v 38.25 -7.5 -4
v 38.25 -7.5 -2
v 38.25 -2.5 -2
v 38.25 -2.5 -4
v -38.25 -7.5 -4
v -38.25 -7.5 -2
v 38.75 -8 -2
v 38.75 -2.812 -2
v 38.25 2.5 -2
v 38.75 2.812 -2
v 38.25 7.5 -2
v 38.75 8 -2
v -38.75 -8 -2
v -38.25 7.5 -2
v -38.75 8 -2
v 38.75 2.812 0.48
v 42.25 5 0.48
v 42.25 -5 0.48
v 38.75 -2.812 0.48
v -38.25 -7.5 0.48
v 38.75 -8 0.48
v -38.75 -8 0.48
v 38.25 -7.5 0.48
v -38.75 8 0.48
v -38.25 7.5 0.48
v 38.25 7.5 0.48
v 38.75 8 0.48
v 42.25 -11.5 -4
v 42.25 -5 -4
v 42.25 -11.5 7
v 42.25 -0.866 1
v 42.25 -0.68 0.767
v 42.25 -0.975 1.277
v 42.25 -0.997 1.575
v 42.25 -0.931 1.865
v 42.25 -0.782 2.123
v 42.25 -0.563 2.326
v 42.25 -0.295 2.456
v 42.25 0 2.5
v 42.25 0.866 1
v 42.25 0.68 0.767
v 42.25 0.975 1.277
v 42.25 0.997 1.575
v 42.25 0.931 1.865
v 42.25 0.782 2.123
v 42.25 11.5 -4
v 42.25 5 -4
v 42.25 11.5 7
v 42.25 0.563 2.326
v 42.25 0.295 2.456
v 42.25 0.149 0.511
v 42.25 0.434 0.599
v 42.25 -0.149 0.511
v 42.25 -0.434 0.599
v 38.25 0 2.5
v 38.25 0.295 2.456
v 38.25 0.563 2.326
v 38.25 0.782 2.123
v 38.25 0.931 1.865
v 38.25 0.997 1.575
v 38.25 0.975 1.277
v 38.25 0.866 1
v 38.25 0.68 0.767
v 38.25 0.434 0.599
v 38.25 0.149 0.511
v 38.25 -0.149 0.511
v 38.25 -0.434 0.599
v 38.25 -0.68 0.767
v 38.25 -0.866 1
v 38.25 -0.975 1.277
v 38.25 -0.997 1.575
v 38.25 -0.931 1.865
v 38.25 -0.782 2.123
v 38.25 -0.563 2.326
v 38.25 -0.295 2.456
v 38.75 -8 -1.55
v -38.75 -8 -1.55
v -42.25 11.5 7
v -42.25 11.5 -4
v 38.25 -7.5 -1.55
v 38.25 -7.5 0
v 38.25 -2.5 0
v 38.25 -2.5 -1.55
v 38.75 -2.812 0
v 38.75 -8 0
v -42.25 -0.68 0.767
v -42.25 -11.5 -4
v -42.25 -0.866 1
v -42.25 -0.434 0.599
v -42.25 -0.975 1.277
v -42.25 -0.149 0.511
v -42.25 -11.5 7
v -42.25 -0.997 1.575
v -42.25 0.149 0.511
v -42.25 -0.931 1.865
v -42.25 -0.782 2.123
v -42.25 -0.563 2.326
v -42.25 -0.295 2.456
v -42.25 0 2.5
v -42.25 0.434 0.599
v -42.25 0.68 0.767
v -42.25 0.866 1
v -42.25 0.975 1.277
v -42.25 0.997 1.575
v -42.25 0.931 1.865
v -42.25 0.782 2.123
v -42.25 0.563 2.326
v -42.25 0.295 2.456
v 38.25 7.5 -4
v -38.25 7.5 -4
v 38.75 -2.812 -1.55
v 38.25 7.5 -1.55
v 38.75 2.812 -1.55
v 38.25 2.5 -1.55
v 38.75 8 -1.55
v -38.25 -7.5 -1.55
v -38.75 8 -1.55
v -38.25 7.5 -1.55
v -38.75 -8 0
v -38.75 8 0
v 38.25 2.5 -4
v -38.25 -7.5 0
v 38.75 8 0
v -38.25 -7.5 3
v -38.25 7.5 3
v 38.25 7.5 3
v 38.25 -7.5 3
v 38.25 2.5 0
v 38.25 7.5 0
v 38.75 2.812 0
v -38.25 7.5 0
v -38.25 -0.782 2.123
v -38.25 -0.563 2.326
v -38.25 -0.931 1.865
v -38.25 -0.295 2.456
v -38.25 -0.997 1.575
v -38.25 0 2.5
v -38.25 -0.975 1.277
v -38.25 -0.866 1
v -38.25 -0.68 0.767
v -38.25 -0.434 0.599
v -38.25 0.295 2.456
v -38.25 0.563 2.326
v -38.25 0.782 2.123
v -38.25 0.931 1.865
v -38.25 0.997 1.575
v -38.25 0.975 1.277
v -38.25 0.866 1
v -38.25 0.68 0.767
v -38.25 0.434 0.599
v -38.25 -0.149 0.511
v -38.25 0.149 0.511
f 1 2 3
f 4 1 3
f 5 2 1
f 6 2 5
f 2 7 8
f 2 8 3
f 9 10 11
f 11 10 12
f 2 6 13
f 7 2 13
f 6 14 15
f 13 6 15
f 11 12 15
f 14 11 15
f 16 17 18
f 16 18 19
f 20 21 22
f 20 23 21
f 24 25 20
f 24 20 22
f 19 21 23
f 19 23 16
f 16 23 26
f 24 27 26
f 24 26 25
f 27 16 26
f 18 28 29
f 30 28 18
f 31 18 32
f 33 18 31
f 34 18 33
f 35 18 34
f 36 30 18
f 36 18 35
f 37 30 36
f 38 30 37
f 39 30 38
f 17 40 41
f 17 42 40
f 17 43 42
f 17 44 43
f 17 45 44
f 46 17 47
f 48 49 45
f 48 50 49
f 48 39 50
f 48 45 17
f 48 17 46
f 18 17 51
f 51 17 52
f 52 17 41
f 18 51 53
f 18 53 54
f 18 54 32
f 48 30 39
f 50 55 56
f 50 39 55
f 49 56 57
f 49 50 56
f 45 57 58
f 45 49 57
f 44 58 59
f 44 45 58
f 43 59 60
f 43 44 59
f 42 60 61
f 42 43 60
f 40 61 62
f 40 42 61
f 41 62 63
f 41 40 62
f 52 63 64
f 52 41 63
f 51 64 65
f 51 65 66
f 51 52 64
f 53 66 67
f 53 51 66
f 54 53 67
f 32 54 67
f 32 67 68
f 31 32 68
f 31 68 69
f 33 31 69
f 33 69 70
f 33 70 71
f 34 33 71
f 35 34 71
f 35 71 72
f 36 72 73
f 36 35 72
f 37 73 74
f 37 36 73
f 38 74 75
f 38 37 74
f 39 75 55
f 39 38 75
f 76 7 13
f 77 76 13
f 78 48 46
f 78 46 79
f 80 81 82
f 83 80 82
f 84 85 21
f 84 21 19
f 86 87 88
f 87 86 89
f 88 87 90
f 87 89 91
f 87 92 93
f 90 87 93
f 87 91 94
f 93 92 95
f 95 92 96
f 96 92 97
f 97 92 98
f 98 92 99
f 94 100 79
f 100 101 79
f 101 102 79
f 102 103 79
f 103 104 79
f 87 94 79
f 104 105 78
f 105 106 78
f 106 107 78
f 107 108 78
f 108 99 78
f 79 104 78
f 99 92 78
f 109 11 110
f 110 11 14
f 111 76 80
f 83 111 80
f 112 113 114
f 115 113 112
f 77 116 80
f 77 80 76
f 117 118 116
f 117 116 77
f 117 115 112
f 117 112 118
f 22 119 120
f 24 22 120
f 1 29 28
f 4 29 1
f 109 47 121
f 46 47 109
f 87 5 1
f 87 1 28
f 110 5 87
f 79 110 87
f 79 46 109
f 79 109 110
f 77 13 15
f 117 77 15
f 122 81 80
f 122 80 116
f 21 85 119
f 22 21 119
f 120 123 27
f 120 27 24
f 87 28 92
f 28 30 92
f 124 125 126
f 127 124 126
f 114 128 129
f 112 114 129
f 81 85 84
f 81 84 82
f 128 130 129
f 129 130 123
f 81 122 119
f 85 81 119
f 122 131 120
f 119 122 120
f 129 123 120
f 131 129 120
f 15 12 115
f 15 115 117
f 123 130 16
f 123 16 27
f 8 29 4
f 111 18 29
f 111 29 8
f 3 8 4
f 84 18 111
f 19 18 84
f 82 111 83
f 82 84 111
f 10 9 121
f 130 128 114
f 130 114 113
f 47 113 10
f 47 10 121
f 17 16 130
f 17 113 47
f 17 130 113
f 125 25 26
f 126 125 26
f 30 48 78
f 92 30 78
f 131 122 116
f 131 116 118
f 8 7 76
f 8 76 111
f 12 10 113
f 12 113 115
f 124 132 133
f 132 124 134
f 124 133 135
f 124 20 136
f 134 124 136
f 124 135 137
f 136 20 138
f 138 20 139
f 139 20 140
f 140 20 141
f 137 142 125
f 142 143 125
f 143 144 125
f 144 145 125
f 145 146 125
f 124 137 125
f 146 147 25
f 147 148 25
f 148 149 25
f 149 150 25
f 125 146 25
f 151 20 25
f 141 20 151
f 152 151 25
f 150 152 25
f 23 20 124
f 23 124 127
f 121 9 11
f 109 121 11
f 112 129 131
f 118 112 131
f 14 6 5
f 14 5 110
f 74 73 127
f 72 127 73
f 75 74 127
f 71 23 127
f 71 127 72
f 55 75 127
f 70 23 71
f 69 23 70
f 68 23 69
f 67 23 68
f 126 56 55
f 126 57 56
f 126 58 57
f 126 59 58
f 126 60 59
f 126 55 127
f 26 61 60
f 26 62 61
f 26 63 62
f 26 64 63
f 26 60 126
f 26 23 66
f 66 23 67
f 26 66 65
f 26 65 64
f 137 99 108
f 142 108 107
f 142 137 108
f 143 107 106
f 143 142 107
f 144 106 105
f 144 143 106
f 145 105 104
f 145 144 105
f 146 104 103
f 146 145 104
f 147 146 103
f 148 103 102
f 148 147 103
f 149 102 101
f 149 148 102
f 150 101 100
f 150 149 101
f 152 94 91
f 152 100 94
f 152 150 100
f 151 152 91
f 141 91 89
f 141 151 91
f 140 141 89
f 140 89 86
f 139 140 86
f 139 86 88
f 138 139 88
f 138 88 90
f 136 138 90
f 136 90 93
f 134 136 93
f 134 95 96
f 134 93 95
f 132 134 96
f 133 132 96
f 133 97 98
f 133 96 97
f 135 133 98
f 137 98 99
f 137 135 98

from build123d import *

# Parameters (mm, degrees)
SKETCH1_W               = 76.5
SKETCH1_H               = 15
BOSS_EXTRUDE1_DEPTH     = 3
SKETCH2_R               = 1
CUT_EXTRUDE1_DEPTH      = 77.92528843
SKETCH3_W               = 84.5
SKETCH3_H               = 23
BOSS_EXTRUDE2_DEPTH     = 7
CUT_EXTRUDE2_DEPTH      = 82.618012718
CUT_EXTRUDE2_DEPTH_BACK = 82.618012718
SKETCH4_R               = 1
SKETCH5_W               = 77.5
SKETCH5_H               = 16
SKETCH5_W_2             = 76.5
SKETCH5_H_2             = 15
CUT_EXTRUDE4_DEPTH      = 0.48
SKETCH10_W              = 84.5
SKETCH10_H              = 23
SKETCH10_W_2            = 76.5
SKETCH10_H_2            = 15
BOSS_EXTRUDE7_DEPTH     = 2
SKETCH11_W              = 77.5
SKETCH11_H              = 16
SKETCH11_W_2            = 76.5
SKETCH11_H_2            = 15
CUT_EXTRUDE5_DEPTH      = 0.45
SKETCH13_W              = 84.5
SKETCH13_H              = 23
SKETCH13_W_2            = 76.5
SKETCH13_H_2            = 15
BOSS_EXTRUDE8_DEPTH     = 2
CUT_EXTRUDE6_START      = -4.48
CUT_EXTRUDE6_DEPTH      = 4.48


with BuildPart() as part:
    # Sketch1 → Boss-Extrude1 (new body)
    with BuildSketch(Plane.XY):
        Rectangle(SKETCH1_W, SKETCH1_H)
    extrude(amount=BOSS_EXTRUDE1_DEPTH)

    # Sketch2 → Cut-Extrude1 (cut, through all)
    with BuildSketch(Plane(origin=(38.25, 0, 0), x_dir=(0, 0, -1), z_dir=(1, 0, 0))):
        with Locations((-1.5, 0)):
            Circle(SKETCH2_R)
    extrude(amount=-CUT_EXTRUDE1_DEPTH, mode=Mode.SUBTRACT)


with BuildPart() as body_2:
    # Sketch3 → Boss-Extrude2 (new body)
    with BuildSketch(Plane(origin=(0, 0, 0), x_dir=(-1, 0, 0), z_dir=(0, 0, -1))):
        Rectangle(SKETCH3_W, SKETCH3_H)
    extrude(amount=-BOSS_EXTRUDE2_DEPTH)

    # Combine1: cut part
    add(part.part, mode=Mode.SUBTRACT)

    # Sketch4 → Cut-Extrude2 (cut, two sides: drawn at the far end of the back side and taken through both)
    with BuildSketch(Plane.ZY.offset(-38.25).offset(-CUT_EXTRUDE2_DEPTH_BACK)):
        with Locations((1.5, 0)):
            Circle(SKETCH4_R)
    extrude(amount=CUT_EXTRUDE2_DEPTH + CUT_EXTRUDE2_DEPTH_BACK, mode=Mode.SUBTRACT)

    # Sketch5 → Cut-Extrude4 (cut)
    with BuildSketch(Plane(origin=(0, 0, 0), x_dir=(-1, 0, 0), z_dir=(0, 0, -1))):
        Rectangle(SKETCH5_W, SKETCH5_H)
        Rectangle(SKETCH5_W_2, SKETCH5_H_2, mode=Mode.SUBTRACT)
    extrude(amount=-CUT_EXTRUDE4_DEPTH, mode=Mode.SUBTRACT)

    # Sketch10 → Boss-Extrude7 (add)
    with BuildSketch(Plane(origin=(0, 0, 0), x_dir=(-1, 0, 0), z_dir=(0, 0, -1))):
        Rectangle(SKETCH10_W, SKETCH10_H)
        Rectangle(SKETCH10_W_2, SKETCH10_H_2, mode=Mode.SUBTRACT)
    extrude(amount=BOSS_EXTRUDE7_DEPTH)

    # Sketch11 → Cut-Extrude5 (cut)
    with BuildSketch(Plane(origin=(0, 0, -2), x_dir=(-1, 0, 0), z_dir=(0, 0, -1))):
        Rectangle(SKETCH11_W, SKETCH11_H)
        Rectangle(SKETCH11_W_2, SKETCH11_H_2, mode=Mode.SUBTRACT)
    extrude(amount=-CUT_EXTRUDE5_DEPTH, mode=Mode.SUBTRACT)

    # Sketch13 → Boss-Extrude8 (add)
    with BuildSketch(Plane(origin=(0, 0, -2), x_dir=(-1, 0, 0), z_dir=(0, 0, -1))):
        Rectangle(SKETCH13_W, SKETCH13_H)
        Rectangle(SKETCH13_W_2, SKETCH13_H_2, mode=Mode.SUBTRACT)
    extrude(amount=BOSS_EXTRUDE8_DEPTH)

    # Sketch14 → Cut-Extrude6 (cut)
    with BuildSketch(Plane(origin=(0, 0, -4), x_dir=(-1, 0, 0), z_dir=(0, 0, -1)).offset(CUT_EXTRUDE6_START)):
        Polygon((-42.25, -5), (-38.25, -2.5), (-38.25, 2.5), (-42.25, 5), align=None)
    extrude(amount=CUT_EXTRUDE6_DEPTH, mode=Mode.SUBTRACT)


solid = body_2.part
